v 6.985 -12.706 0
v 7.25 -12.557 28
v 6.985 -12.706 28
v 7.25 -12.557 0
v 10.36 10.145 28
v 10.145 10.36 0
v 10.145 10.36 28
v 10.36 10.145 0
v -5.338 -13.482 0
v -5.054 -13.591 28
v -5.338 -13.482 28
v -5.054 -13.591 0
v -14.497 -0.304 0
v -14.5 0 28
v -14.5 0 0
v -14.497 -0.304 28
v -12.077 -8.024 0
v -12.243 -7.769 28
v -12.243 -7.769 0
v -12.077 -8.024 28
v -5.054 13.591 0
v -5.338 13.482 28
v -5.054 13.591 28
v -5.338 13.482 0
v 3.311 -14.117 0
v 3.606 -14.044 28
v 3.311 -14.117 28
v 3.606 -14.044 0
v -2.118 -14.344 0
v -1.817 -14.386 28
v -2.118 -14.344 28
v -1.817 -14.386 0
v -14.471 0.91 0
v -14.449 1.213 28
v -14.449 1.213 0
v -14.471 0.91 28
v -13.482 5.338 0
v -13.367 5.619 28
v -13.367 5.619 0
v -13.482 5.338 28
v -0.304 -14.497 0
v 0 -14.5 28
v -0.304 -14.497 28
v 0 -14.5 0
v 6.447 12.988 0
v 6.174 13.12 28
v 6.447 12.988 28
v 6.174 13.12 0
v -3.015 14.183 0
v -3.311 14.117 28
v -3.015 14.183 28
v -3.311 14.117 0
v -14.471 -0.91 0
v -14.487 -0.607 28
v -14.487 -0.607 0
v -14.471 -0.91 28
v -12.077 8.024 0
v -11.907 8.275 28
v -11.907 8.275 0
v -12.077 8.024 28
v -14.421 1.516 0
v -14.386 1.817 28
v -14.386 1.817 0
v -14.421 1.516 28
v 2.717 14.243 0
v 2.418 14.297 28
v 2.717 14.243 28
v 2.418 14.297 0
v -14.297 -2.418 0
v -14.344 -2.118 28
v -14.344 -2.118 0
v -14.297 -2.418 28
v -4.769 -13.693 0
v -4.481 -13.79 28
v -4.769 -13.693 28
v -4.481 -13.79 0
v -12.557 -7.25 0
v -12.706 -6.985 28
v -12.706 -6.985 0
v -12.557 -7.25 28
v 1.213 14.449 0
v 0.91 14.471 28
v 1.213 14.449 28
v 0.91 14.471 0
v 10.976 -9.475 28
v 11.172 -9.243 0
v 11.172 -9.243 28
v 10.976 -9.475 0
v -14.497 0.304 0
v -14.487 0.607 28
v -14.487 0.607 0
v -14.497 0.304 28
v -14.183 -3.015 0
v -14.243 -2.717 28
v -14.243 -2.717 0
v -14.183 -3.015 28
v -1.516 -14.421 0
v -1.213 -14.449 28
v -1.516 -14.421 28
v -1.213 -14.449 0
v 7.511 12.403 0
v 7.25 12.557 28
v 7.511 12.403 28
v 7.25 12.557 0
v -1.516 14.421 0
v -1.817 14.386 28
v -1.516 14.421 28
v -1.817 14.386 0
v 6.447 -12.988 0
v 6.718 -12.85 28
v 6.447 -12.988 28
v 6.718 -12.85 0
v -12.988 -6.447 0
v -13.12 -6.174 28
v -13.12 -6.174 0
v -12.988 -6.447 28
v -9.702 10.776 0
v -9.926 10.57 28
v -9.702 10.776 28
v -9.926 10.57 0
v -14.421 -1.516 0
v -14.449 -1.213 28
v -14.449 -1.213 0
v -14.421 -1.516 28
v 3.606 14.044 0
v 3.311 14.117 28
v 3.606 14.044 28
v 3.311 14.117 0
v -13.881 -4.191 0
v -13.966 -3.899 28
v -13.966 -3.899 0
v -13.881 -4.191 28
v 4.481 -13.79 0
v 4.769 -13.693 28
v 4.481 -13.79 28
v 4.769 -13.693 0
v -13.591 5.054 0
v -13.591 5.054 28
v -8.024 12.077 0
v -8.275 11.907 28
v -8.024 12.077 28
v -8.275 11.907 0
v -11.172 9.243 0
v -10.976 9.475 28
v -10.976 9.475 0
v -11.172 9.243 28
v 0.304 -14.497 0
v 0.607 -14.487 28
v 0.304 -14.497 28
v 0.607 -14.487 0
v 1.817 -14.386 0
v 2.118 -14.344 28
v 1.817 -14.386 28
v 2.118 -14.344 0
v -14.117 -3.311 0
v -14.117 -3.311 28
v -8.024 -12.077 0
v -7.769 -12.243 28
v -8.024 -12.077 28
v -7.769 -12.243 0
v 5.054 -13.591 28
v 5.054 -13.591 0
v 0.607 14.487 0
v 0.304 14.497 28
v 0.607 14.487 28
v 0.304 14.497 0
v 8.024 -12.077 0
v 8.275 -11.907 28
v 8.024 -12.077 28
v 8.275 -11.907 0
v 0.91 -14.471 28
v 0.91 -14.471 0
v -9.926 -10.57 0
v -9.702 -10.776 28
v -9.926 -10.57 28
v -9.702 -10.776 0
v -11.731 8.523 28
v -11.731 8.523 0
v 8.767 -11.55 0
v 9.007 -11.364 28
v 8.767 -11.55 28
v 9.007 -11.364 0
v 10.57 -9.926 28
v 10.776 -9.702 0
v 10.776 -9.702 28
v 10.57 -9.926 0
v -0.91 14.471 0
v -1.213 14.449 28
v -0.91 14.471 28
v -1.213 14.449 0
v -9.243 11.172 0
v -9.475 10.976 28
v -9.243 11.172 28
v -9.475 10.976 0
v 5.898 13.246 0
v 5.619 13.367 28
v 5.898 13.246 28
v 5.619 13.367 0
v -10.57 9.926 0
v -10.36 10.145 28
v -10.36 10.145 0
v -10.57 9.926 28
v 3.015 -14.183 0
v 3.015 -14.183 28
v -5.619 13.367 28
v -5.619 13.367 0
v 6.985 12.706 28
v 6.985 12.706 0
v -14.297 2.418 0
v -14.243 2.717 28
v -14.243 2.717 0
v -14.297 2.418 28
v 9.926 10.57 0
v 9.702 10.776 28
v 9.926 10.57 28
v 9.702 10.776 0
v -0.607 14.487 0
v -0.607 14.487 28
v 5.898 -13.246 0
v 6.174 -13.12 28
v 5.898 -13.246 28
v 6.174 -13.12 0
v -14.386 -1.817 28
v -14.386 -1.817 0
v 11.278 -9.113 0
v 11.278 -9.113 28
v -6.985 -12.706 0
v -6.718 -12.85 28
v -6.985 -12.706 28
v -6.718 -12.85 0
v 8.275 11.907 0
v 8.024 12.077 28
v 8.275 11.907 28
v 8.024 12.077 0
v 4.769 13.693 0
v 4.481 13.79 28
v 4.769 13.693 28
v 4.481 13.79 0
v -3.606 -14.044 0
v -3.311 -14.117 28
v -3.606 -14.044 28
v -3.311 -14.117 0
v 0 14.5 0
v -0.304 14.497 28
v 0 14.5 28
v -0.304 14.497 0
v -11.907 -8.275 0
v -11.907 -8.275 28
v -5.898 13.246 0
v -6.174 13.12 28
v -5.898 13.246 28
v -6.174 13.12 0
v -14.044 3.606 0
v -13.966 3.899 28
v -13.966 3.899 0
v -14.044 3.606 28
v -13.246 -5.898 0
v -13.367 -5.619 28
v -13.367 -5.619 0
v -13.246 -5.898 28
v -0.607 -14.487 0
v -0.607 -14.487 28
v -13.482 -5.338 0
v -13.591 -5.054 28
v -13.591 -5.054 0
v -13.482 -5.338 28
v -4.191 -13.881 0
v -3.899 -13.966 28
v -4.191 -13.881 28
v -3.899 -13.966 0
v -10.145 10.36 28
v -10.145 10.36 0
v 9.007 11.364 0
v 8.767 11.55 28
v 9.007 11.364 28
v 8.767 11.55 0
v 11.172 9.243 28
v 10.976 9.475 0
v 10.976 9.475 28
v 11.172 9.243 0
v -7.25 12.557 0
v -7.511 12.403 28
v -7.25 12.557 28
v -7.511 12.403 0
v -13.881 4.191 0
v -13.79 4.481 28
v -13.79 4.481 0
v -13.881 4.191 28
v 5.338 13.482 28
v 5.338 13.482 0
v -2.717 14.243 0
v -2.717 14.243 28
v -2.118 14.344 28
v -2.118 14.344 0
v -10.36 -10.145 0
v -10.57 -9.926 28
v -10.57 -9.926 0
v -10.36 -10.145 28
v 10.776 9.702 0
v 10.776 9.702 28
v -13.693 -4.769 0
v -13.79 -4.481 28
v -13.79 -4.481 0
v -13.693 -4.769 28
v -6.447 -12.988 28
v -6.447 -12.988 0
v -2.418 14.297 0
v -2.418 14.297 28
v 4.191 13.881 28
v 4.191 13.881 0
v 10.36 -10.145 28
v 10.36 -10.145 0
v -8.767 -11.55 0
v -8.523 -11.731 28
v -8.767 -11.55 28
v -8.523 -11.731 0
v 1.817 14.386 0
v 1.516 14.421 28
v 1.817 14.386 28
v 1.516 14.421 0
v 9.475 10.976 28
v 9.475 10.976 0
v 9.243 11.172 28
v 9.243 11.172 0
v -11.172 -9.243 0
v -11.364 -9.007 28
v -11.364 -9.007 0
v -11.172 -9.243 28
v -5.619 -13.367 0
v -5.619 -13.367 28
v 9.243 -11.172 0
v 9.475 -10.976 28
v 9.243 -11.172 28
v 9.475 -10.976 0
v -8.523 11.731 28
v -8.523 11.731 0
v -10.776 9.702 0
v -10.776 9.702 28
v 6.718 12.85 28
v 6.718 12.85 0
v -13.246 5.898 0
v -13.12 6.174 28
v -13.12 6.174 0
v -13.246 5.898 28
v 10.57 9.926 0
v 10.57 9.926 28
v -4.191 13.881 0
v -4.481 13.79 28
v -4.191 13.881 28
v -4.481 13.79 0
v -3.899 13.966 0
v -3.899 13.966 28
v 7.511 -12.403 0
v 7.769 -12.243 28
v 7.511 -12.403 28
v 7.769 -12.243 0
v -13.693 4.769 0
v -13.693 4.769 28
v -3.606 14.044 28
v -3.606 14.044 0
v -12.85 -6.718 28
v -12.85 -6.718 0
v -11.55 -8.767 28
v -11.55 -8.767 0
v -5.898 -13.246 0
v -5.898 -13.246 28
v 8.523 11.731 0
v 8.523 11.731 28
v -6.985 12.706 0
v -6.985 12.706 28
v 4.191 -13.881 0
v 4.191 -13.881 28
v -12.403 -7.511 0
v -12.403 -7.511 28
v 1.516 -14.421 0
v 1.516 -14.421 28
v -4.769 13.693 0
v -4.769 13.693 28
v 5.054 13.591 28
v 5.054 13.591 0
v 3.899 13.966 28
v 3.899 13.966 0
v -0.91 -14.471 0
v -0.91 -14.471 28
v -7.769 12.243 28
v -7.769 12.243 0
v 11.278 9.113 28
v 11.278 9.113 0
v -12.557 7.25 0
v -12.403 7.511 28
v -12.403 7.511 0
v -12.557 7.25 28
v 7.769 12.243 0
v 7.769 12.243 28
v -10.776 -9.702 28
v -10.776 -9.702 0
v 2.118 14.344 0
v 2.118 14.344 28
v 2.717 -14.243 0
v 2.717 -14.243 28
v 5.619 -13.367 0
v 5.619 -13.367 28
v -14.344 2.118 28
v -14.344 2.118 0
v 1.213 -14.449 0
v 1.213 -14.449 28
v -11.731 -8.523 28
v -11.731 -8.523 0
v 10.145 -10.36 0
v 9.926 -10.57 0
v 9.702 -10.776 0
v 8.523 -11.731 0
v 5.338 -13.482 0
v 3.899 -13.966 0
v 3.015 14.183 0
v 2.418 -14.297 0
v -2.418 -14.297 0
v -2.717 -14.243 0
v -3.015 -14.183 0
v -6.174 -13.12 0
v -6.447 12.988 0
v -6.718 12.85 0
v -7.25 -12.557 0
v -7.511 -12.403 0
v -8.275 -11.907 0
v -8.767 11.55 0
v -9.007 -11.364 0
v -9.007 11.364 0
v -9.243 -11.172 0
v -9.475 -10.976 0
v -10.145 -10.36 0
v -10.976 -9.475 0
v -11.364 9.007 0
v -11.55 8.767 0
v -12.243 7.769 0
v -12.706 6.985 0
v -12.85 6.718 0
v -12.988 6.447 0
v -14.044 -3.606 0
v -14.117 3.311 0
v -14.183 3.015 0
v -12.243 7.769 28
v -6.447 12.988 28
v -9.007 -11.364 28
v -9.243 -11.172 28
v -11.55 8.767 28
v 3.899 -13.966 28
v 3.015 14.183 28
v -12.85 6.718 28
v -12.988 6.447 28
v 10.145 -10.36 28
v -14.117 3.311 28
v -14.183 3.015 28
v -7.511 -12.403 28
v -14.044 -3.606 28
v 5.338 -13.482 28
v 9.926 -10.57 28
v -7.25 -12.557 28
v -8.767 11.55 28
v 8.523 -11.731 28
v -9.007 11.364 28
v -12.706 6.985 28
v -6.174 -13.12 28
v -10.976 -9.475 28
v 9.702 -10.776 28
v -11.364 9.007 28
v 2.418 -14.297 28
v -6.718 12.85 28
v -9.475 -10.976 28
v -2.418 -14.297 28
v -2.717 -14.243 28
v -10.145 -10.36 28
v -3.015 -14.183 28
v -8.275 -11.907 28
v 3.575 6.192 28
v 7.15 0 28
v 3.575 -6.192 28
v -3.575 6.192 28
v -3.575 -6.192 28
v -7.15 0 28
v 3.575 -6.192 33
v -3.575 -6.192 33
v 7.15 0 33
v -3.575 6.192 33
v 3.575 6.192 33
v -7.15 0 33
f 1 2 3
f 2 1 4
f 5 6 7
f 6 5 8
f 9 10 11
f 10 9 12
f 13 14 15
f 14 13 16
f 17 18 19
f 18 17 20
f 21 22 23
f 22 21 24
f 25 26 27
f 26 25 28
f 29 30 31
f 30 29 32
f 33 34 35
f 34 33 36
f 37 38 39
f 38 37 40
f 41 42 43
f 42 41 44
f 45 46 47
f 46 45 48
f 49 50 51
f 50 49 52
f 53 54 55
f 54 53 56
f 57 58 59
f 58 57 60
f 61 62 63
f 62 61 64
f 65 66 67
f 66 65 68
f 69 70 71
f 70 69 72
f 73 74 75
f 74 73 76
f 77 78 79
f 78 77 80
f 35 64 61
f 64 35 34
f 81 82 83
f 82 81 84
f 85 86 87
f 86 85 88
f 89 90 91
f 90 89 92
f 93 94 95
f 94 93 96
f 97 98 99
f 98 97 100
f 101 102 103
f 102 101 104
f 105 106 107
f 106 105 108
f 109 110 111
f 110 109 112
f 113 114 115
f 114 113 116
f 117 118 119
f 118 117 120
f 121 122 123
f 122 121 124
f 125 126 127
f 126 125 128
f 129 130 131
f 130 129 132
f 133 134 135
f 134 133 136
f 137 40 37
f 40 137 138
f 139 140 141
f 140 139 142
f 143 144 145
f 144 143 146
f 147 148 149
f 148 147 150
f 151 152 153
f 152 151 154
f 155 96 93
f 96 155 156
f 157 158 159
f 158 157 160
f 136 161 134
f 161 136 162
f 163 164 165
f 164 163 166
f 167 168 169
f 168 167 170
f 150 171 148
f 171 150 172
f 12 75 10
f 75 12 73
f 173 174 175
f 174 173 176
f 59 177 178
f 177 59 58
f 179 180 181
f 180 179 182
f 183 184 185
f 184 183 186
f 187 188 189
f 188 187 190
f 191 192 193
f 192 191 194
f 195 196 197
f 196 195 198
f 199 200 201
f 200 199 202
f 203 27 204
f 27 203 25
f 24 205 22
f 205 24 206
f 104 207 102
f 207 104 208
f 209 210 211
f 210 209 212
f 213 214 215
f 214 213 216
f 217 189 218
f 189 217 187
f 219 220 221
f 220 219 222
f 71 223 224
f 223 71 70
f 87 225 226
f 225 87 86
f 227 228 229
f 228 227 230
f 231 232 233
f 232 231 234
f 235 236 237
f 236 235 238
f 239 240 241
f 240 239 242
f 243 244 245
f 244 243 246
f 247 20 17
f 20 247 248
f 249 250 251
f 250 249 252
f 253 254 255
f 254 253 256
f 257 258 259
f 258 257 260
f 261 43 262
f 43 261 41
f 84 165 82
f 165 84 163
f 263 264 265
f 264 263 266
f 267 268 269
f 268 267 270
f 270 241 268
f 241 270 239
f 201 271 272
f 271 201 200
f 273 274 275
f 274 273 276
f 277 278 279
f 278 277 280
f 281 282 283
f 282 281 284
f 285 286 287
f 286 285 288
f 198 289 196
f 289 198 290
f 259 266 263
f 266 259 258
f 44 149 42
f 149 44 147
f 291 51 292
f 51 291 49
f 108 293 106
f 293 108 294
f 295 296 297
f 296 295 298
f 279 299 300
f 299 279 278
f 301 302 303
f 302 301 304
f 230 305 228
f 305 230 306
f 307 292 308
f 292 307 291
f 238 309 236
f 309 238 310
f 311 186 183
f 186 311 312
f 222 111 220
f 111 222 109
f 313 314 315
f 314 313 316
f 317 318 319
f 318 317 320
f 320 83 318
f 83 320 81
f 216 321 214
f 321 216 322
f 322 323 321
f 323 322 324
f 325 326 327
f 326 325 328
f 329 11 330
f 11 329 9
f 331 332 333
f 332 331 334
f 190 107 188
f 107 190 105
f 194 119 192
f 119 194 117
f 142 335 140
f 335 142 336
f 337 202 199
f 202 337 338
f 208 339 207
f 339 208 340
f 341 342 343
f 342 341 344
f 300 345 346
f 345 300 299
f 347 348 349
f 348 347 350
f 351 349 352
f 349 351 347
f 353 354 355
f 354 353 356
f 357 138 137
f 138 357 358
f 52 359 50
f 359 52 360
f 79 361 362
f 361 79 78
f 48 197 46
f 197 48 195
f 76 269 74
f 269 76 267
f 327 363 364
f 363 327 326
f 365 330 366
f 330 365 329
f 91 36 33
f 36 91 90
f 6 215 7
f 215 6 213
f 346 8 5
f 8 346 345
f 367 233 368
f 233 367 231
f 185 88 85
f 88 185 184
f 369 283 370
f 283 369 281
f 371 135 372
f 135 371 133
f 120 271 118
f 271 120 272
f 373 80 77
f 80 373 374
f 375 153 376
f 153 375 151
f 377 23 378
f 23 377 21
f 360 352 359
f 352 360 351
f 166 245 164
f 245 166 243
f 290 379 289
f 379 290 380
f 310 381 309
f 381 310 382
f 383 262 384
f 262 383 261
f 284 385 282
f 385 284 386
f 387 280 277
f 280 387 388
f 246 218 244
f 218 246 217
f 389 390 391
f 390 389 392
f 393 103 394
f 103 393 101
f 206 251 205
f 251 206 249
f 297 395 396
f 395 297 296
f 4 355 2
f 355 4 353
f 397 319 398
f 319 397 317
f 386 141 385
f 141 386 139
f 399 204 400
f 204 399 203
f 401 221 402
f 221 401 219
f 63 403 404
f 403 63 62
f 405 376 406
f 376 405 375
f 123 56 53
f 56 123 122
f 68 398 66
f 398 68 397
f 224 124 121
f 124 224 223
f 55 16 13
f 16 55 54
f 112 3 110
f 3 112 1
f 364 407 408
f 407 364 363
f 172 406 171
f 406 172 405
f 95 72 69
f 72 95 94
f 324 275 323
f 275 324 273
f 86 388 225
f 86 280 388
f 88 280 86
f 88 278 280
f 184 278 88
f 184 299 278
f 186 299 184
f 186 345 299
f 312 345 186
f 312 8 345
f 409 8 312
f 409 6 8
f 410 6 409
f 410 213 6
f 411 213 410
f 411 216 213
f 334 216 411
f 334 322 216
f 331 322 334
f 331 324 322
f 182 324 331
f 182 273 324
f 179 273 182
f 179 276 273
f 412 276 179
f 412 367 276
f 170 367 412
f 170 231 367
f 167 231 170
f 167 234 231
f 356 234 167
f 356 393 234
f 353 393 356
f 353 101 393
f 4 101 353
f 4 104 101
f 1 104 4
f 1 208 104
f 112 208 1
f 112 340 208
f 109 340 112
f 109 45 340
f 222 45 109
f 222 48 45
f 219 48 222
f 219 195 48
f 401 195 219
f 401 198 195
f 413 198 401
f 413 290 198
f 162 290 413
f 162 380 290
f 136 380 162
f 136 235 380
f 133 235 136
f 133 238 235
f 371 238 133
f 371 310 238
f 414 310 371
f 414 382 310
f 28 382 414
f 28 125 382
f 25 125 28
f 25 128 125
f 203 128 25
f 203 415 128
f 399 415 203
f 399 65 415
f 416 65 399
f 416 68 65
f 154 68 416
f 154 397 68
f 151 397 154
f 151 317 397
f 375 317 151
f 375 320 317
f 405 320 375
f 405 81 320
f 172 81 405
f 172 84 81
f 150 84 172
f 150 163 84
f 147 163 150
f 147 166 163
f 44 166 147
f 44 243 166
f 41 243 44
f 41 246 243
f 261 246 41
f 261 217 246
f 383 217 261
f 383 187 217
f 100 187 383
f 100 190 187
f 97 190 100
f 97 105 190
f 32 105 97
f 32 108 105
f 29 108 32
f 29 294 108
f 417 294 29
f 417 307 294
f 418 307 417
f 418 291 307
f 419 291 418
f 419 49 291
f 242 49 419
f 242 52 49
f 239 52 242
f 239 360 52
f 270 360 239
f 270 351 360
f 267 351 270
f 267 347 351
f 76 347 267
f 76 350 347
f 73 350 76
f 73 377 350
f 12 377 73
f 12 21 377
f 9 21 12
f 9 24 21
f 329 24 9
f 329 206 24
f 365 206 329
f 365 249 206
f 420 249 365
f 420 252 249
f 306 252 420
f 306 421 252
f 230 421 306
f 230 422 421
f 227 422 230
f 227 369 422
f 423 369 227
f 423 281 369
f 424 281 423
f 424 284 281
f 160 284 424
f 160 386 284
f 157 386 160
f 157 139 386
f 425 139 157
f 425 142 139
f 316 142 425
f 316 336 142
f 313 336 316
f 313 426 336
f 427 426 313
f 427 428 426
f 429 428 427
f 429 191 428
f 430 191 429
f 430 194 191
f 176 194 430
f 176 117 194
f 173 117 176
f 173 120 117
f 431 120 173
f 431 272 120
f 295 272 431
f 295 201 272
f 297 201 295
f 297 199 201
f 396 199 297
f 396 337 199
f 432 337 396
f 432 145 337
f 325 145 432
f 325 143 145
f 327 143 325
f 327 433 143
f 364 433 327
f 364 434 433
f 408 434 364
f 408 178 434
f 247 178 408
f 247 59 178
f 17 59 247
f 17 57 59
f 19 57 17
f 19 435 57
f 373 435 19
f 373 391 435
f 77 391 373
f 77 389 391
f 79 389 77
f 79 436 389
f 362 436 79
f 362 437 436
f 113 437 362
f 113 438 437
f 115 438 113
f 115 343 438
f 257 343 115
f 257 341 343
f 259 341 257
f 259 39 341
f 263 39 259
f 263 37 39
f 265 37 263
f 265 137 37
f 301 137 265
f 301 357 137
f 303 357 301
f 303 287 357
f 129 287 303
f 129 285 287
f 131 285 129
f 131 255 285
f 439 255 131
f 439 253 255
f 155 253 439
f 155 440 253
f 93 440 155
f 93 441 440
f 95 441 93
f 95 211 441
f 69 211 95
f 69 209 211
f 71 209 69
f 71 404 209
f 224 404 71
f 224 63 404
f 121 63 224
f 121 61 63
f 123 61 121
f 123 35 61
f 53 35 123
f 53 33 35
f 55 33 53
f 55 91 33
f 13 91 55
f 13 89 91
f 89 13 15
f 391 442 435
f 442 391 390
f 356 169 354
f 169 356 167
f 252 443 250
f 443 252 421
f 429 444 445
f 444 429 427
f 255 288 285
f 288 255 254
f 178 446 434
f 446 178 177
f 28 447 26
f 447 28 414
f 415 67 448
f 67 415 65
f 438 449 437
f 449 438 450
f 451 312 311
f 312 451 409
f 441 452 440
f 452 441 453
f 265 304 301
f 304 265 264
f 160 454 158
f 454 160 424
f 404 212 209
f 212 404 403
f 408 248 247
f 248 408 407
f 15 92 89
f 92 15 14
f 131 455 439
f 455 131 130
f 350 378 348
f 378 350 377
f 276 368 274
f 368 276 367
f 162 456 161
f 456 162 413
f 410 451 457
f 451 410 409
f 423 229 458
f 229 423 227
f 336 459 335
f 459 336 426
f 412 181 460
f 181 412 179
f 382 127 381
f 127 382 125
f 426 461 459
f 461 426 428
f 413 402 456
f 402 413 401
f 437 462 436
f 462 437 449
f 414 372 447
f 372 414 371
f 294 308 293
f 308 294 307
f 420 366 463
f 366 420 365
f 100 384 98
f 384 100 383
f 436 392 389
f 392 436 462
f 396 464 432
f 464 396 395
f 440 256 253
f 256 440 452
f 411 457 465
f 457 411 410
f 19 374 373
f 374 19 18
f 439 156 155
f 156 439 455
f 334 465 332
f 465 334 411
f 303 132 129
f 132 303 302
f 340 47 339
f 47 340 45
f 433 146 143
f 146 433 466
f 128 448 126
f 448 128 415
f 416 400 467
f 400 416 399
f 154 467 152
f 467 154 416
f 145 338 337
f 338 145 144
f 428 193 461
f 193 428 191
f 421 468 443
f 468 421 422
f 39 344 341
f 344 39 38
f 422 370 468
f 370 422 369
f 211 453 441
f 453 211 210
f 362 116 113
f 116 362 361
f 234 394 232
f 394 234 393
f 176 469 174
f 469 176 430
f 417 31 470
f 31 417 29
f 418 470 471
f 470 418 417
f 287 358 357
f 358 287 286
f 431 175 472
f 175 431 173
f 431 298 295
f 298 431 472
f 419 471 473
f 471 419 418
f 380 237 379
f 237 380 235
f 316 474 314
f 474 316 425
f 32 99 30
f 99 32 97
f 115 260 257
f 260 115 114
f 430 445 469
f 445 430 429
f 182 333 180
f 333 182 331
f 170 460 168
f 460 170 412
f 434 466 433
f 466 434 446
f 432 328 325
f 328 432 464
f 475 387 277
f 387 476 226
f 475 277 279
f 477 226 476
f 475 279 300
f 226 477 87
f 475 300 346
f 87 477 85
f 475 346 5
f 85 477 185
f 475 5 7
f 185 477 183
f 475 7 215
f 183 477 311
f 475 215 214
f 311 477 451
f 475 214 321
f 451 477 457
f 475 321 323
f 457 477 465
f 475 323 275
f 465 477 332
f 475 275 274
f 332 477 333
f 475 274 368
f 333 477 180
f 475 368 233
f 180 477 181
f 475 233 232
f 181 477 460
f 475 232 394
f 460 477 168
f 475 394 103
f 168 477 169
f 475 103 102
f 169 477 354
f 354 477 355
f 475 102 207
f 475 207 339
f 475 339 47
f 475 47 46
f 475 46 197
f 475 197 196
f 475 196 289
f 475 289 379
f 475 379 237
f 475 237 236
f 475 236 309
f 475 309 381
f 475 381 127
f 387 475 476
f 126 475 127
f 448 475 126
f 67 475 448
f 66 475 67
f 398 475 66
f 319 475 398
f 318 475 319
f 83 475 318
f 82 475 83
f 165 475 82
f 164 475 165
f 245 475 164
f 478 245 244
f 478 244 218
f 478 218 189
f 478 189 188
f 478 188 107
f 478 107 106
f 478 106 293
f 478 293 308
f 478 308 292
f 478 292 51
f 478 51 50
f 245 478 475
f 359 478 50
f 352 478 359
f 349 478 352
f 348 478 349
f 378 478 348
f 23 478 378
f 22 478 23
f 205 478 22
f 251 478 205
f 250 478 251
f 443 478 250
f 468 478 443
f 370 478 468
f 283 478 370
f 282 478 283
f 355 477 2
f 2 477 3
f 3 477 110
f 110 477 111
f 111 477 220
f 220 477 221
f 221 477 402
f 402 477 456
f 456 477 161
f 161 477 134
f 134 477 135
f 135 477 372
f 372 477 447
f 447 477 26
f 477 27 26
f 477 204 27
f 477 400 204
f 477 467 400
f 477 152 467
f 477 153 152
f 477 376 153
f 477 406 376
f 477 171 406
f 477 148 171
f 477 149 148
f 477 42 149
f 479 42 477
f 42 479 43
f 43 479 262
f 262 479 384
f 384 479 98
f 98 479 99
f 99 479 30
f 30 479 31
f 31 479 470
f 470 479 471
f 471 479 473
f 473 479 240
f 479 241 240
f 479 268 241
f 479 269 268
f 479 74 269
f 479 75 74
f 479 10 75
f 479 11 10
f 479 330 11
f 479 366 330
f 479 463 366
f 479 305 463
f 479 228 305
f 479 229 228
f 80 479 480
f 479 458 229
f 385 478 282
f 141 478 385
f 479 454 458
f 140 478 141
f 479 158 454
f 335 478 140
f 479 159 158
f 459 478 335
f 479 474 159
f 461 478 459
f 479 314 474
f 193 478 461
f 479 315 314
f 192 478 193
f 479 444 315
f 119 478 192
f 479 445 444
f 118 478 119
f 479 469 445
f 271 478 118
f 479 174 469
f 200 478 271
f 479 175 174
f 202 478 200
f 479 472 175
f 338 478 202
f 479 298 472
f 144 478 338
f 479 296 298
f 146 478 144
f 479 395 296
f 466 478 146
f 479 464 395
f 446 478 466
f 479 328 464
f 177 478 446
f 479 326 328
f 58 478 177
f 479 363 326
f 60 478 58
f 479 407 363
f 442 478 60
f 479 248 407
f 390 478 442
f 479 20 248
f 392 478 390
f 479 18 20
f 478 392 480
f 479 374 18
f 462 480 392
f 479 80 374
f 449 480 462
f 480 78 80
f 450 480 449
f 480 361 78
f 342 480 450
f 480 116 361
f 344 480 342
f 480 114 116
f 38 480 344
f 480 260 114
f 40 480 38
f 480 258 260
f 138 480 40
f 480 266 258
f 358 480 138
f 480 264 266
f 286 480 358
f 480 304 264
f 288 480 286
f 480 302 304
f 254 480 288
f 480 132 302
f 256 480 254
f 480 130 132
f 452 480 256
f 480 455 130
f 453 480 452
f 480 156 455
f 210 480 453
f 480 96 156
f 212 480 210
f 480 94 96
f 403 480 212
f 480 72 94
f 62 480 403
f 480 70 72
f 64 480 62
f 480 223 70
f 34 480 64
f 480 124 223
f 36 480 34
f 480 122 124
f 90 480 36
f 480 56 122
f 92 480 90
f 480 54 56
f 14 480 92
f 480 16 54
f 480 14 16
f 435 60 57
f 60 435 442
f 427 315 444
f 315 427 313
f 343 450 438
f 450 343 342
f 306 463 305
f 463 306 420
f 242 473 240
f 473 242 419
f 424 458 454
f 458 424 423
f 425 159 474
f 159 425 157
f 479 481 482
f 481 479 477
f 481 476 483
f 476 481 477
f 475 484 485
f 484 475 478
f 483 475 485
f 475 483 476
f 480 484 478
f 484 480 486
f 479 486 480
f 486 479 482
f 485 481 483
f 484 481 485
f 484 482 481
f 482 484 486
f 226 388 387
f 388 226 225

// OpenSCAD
///////////////////////////////////////////////////////////////////////////////////////////
// Train Whistle Plug (for like https://www.adventure-in-a-box.com/make-train-whistle/)
// Ryan Stachurski
// 2018-03-17
///////////////////////////////////////////////////////////////////////////////////////////
innerRadius = 29/2;
length      = 28;
cut         = 1/9; //(percent of whole along Z)
hexRad      = 14.3/2; //Radius of a circle touching every vertices along the hex cap bolt (5/16")
hexHeight   = 5;
$fn=300;   

difference(){
    
    union(){
        cylinder(h=length, r=innerRadius);
        cylinder($fn=6,h=length+hexHeight,r=hexRad);
    }//end union
    translate([innerRadius-(innerRadius*2*cut),-innerRadius,-1]) cube([innerRadius*2,innerRadius*2,length+2]);
}

//profit 
